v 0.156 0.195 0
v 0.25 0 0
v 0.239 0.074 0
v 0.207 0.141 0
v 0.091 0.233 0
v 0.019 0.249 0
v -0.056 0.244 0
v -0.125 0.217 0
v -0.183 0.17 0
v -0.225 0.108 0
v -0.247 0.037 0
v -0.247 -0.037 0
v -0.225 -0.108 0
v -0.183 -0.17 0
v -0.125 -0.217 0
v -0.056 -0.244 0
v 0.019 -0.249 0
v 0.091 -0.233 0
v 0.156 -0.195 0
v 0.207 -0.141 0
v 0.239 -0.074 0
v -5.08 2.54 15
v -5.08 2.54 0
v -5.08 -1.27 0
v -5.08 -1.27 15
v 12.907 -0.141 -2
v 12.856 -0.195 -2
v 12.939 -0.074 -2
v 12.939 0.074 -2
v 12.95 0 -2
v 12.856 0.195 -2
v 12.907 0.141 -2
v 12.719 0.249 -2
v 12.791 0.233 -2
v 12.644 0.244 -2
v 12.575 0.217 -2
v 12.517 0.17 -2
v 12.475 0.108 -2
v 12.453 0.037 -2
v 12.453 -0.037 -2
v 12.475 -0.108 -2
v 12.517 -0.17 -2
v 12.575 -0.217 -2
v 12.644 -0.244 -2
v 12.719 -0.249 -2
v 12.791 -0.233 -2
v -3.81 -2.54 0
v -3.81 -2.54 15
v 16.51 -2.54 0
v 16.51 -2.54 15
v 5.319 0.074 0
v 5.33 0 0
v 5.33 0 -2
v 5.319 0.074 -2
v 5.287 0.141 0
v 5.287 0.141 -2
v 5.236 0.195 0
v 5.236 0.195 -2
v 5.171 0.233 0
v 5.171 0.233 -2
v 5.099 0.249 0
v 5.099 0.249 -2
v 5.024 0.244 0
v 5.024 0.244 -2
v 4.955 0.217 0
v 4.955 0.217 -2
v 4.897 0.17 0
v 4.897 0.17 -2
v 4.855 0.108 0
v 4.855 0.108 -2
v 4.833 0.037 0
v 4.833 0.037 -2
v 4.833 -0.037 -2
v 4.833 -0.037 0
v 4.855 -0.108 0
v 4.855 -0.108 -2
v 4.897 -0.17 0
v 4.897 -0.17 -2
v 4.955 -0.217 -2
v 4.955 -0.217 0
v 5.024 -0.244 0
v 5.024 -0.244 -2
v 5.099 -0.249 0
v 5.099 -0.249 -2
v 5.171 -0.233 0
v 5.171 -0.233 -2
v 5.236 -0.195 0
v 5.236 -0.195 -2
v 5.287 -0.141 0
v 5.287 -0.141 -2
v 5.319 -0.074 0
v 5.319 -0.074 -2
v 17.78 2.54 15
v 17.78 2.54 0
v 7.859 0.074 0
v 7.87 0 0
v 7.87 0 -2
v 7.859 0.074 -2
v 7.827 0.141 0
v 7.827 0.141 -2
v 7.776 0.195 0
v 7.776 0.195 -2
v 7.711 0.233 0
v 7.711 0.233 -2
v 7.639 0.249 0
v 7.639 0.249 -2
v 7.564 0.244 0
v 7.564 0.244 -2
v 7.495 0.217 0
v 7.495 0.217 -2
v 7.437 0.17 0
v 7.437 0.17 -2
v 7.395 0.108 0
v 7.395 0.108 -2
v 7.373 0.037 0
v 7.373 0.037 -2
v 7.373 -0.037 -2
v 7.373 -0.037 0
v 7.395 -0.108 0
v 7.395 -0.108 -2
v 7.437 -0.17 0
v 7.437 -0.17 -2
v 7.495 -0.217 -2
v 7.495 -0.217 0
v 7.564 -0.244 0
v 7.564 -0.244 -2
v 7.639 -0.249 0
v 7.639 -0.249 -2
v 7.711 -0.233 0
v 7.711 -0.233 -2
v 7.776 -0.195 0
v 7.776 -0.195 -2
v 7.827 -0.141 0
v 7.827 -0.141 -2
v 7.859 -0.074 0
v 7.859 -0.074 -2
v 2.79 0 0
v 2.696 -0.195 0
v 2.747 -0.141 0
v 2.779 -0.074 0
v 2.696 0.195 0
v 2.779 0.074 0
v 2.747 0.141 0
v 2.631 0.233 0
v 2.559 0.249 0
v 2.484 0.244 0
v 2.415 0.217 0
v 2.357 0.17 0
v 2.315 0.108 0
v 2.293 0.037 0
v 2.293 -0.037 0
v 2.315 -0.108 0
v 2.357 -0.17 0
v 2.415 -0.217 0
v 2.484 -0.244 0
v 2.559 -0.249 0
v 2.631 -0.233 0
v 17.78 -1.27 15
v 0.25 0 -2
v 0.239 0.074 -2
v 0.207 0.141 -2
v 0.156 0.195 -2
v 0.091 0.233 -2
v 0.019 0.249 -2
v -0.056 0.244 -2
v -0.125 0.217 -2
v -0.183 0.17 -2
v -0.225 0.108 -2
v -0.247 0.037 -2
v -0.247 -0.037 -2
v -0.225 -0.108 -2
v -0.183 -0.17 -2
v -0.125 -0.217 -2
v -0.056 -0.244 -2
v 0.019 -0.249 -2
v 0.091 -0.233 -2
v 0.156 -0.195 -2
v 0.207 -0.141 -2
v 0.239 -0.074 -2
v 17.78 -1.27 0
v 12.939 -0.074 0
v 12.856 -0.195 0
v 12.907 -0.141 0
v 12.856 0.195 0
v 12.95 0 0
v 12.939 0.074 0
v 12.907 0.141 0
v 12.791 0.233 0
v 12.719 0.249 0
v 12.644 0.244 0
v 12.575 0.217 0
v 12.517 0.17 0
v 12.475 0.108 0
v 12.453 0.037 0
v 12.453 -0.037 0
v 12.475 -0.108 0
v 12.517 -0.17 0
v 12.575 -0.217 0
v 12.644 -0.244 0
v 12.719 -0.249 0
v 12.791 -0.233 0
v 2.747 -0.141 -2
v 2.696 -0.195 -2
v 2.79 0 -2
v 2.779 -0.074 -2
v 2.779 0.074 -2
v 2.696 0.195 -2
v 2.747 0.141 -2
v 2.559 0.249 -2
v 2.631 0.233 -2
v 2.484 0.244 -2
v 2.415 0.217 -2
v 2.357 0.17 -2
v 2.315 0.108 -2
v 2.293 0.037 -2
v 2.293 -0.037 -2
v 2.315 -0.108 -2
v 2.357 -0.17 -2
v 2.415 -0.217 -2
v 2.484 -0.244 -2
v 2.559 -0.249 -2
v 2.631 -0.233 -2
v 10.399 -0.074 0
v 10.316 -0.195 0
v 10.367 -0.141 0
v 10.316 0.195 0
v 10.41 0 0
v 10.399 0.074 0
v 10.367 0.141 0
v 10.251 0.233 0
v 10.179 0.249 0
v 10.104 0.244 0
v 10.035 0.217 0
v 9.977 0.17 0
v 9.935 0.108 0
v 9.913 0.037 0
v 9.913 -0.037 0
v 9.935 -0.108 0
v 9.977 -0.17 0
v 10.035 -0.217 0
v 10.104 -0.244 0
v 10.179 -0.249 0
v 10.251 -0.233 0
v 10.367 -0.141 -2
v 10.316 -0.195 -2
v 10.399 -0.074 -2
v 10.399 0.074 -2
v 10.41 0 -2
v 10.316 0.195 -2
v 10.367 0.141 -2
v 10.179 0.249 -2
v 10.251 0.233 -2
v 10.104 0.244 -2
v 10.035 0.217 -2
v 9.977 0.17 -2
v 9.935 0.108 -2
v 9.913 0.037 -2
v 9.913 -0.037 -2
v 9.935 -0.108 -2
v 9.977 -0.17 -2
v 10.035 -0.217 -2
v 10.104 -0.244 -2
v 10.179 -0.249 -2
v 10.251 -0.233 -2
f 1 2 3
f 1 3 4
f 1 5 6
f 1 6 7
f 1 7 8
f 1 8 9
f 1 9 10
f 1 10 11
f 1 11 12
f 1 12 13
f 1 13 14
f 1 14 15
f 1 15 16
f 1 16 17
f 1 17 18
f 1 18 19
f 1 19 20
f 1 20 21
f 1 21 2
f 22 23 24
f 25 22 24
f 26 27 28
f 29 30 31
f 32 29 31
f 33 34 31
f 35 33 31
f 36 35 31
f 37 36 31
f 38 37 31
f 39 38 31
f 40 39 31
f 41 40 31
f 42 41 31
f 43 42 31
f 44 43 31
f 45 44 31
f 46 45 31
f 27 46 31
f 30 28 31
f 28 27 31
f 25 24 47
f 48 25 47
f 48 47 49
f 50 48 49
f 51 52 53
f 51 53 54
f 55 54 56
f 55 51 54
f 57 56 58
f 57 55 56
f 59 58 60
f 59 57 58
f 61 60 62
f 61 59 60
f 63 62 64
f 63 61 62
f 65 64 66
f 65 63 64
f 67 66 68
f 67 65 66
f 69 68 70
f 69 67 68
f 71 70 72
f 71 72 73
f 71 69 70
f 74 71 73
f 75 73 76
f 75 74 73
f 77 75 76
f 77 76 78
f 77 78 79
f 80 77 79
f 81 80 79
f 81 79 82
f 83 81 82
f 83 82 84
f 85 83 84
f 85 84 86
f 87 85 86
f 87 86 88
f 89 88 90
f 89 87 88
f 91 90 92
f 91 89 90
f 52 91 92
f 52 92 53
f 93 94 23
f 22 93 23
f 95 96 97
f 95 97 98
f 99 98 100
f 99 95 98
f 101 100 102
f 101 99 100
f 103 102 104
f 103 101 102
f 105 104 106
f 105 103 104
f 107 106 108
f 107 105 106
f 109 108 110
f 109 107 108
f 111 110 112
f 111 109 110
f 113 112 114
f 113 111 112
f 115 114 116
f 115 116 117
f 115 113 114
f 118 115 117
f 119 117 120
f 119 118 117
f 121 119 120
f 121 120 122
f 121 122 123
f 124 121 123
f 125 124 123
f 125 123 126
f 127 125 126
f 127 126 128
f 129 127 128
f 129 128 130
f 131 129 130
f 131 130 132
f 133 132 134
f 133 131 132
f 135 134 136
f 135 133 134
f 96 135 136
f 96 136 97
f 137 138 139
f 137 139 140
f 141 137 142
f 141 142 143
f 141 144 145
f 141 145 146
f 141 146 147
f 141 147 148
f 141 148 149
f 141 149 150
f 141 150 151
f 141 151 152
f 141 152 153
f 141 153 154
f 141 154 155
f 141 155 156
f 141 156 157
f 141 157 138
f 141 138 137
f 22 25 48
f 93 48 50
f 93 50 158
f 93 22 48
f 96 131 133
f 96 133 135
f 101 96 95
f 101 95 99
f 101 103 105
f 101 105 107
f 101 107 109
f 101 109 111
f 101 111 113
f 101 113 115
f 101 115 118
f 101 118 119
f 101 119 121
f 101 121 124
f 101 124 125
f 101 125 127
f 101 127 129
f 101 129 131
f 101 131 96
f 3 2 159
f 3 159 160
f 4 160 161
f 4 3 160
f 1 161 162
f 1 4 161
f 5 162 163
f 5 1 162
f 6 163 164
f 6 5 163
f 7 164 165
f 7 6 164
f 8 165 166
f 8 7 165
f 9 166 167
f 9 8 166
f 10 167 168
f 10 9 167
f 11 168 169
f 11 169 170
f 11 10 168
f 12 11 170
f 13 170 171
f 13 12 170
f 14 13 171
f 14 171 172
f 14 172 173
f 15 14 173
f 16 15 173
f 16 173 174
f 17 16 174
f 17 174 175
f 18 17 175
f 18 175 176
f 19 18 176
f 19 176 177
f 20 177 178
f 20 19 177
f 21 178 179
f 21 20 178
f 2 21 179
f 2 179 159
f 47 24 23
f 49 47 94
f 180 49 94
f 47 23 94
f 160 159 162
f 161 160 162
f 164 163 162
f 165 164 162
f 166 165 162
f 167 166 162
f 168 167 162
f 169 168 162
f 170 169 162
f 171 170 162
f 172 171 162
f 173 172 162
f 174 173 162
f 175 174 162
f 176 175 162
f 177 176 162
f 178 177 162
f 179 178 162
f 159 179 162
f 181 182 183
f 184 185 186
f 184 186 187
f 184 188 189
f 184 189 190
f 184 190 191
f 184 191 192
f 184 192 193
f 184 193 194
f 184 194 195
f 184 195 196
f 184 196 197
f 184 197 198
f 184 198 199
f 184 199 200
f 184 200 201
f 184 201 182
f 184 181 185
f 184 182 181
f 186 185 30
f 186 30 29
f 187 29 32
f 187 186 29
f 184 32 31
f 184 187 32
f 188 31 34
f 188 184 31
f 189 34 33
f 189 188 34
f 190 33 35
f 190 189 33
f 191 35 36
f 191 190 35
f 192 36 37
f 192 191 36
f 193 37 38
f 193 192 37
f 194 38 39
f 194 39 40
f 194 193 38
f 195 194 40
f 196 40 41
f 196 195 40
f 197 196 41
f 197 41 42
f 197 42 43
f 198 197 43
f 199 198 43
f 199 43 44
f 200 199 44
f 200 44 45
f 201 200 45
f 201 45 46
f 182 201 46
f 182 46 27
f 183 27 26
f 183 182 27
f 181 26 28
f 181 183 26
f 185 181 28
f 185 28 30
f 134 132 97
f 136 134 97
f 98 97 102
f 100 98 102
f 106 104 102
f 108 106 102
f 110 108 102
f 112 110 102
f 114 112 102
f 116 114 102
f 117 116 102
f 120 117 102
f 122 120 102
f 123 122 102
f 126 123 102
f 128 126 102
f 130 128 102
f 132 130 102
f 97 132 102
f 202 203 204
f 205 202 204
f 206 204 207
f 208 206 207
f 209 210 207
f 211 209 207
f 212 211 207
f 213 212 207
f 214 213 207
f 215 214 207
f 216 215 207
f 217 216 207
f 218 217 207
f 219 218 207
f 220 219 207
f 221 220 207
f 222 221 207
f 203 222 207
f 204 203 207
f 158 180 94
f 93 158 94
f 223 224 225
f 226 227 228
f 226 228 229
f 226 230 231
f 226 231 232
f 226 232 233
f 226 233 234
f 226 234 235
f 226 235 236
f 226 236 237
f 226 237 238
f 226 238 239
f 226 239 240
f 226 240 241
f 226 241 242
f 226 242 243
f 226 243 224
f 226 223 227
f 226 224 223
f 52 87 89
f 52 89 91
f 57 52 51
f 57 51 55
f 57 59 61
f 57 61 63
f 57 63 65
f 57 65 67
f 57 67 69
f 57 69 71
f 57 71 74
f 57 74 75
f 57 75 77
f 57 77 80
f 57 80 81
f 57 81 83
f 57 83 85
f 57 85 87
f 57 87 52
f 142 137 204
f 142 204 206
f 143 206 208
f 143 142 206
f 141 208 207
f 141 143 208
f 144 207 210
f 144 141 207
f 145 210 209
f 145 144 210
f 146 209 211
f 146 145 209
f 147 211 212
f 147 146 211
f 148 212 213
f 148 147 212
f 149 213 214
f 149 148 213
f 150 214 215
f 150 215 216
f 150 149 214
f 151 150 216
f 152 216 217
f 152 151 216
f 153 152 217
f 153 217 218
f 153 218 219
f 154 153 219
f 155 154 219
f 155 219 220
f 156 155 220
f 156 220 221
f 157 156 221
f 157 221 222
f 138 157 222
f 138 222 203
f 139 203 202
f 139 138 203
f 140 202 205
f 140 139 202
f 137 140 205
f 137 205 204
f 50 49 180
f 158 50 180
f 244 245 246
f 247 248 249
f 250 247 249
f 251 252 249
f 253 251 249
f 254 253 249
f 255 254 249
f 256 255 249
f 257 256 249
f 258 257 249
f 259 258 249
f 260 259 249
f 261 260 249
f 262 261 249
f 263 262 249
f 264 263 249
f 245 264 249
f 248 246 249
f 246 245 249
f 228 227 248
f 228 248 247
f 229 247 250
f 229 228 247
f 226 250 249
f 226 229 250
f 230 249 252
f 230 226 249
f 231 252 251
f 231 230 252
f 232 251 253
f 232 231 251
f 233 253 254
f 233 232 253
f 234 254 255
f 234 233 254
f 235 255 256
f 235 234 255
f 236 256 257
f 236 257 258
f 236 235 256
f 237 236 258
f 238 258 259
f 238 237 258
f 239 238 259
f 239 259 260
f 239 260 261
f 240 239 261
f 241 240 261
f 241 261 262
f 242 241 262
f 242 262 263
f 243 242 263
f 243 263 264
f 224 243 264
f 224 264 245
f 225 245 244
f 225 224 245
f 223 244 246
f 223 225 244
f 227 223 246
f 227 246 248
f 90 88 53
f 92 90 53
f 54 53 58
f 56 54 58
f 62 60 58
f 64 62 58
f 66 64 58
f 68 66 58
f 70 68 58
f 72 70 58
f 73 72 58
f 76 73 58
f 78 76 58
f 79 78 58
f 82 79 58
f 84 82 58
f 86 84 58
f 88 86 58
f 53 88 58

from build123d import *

# Parameters (mm, degrees)
COMPONENT_OUTLINE_DEPTH = 15
SKETCH2_R               = 0.25
EXTRUDE_1_DEPTH         = 2
SKETCH3_R               = 0.25
EXTRUDE_2_DEPTH         = 2
SKETCH4_R               = 0.25
EXTRUDE_3_DEPTH         = 2
SKETCH5_R               = 0.25
EXTRUDE_4_DEPTH         = 2
SKETCH6_R               = 0.25
EXTRUDE_5_DEPTH         = 2
SKETCH7_R               = 0.25
EXTRUDE_6_DEPTH         = 2


with BuildPart() as part:
    # Sketch1 → Component_Outline (new body)
    with BuildSketch(Plane.XY):
        Polygon((-5.08, 2.54), (-5.08, -1.27), (-3.81, -2.54), (16.51, -2.54), (17.78, -1.27), (17.78, 2.54), align=None)
    extrude(amount=COMPONENT_OUTLINE_DEPTH)


with BuildPart() as body_2:
    # Sketch2 → Extrude 1 (new body)
    with BuildSketch(Plane.XY):
        Circle(SKETCH2_R)
    extrude(amount=-EXTRUDE_1_DEPTH)


with BuildPart() as body_3:
    # Sketch3 → Extrude 2 (new body)
    with BuildSketch(Plane.XY):
        with Locations((2.54, 0)):
            Circle(SKETCH3_R)
    extrude(amount=-EXTRUDE_2_DEPTH)


with BuildPart() as body_4:
    # Sketch4 → Extrude 3 (new body)
    with BuildSketch(Plane.XY):
        with Locations((5.08, 0)):
            Circle(SKETCH4_R)
    extrude(amount=-EXTRUDE_3_DEPTH)


with BuildPart() as body_5:
    # Sketch5 → Extrude 4 (new body)
    with BuildSketch(Plane.XY):
        with Locations((7.62, 0)):
            Circle(SKETCH5_R)
    extrude(amount=-EXTRUDE_4_DEPTH)


with BuildPart() as body_6:
    # Sketch6 → Extrude 5 (new body)
    with BuildSketch(Plane.XY):
        with Locations((10.16, 0)):
            Circle(SKETCH6_R)
    extrude(amount=-EXTRUDE_5_DEPTH)


with BuildPart() as body_7:
    # Sketch7 → Extrude 6 (new body)
    with BuildSketch(Plane.XY):
        with Locations((12.7, 0)):
            Circle(SKETCH7_R)
    extrude(amount=-EXTRUDE_6_DEPTH)


solid = Compound([part.part, body_2.part, body_3.part, body_4.part, body_5.part, body_6.part, body_7.part])
